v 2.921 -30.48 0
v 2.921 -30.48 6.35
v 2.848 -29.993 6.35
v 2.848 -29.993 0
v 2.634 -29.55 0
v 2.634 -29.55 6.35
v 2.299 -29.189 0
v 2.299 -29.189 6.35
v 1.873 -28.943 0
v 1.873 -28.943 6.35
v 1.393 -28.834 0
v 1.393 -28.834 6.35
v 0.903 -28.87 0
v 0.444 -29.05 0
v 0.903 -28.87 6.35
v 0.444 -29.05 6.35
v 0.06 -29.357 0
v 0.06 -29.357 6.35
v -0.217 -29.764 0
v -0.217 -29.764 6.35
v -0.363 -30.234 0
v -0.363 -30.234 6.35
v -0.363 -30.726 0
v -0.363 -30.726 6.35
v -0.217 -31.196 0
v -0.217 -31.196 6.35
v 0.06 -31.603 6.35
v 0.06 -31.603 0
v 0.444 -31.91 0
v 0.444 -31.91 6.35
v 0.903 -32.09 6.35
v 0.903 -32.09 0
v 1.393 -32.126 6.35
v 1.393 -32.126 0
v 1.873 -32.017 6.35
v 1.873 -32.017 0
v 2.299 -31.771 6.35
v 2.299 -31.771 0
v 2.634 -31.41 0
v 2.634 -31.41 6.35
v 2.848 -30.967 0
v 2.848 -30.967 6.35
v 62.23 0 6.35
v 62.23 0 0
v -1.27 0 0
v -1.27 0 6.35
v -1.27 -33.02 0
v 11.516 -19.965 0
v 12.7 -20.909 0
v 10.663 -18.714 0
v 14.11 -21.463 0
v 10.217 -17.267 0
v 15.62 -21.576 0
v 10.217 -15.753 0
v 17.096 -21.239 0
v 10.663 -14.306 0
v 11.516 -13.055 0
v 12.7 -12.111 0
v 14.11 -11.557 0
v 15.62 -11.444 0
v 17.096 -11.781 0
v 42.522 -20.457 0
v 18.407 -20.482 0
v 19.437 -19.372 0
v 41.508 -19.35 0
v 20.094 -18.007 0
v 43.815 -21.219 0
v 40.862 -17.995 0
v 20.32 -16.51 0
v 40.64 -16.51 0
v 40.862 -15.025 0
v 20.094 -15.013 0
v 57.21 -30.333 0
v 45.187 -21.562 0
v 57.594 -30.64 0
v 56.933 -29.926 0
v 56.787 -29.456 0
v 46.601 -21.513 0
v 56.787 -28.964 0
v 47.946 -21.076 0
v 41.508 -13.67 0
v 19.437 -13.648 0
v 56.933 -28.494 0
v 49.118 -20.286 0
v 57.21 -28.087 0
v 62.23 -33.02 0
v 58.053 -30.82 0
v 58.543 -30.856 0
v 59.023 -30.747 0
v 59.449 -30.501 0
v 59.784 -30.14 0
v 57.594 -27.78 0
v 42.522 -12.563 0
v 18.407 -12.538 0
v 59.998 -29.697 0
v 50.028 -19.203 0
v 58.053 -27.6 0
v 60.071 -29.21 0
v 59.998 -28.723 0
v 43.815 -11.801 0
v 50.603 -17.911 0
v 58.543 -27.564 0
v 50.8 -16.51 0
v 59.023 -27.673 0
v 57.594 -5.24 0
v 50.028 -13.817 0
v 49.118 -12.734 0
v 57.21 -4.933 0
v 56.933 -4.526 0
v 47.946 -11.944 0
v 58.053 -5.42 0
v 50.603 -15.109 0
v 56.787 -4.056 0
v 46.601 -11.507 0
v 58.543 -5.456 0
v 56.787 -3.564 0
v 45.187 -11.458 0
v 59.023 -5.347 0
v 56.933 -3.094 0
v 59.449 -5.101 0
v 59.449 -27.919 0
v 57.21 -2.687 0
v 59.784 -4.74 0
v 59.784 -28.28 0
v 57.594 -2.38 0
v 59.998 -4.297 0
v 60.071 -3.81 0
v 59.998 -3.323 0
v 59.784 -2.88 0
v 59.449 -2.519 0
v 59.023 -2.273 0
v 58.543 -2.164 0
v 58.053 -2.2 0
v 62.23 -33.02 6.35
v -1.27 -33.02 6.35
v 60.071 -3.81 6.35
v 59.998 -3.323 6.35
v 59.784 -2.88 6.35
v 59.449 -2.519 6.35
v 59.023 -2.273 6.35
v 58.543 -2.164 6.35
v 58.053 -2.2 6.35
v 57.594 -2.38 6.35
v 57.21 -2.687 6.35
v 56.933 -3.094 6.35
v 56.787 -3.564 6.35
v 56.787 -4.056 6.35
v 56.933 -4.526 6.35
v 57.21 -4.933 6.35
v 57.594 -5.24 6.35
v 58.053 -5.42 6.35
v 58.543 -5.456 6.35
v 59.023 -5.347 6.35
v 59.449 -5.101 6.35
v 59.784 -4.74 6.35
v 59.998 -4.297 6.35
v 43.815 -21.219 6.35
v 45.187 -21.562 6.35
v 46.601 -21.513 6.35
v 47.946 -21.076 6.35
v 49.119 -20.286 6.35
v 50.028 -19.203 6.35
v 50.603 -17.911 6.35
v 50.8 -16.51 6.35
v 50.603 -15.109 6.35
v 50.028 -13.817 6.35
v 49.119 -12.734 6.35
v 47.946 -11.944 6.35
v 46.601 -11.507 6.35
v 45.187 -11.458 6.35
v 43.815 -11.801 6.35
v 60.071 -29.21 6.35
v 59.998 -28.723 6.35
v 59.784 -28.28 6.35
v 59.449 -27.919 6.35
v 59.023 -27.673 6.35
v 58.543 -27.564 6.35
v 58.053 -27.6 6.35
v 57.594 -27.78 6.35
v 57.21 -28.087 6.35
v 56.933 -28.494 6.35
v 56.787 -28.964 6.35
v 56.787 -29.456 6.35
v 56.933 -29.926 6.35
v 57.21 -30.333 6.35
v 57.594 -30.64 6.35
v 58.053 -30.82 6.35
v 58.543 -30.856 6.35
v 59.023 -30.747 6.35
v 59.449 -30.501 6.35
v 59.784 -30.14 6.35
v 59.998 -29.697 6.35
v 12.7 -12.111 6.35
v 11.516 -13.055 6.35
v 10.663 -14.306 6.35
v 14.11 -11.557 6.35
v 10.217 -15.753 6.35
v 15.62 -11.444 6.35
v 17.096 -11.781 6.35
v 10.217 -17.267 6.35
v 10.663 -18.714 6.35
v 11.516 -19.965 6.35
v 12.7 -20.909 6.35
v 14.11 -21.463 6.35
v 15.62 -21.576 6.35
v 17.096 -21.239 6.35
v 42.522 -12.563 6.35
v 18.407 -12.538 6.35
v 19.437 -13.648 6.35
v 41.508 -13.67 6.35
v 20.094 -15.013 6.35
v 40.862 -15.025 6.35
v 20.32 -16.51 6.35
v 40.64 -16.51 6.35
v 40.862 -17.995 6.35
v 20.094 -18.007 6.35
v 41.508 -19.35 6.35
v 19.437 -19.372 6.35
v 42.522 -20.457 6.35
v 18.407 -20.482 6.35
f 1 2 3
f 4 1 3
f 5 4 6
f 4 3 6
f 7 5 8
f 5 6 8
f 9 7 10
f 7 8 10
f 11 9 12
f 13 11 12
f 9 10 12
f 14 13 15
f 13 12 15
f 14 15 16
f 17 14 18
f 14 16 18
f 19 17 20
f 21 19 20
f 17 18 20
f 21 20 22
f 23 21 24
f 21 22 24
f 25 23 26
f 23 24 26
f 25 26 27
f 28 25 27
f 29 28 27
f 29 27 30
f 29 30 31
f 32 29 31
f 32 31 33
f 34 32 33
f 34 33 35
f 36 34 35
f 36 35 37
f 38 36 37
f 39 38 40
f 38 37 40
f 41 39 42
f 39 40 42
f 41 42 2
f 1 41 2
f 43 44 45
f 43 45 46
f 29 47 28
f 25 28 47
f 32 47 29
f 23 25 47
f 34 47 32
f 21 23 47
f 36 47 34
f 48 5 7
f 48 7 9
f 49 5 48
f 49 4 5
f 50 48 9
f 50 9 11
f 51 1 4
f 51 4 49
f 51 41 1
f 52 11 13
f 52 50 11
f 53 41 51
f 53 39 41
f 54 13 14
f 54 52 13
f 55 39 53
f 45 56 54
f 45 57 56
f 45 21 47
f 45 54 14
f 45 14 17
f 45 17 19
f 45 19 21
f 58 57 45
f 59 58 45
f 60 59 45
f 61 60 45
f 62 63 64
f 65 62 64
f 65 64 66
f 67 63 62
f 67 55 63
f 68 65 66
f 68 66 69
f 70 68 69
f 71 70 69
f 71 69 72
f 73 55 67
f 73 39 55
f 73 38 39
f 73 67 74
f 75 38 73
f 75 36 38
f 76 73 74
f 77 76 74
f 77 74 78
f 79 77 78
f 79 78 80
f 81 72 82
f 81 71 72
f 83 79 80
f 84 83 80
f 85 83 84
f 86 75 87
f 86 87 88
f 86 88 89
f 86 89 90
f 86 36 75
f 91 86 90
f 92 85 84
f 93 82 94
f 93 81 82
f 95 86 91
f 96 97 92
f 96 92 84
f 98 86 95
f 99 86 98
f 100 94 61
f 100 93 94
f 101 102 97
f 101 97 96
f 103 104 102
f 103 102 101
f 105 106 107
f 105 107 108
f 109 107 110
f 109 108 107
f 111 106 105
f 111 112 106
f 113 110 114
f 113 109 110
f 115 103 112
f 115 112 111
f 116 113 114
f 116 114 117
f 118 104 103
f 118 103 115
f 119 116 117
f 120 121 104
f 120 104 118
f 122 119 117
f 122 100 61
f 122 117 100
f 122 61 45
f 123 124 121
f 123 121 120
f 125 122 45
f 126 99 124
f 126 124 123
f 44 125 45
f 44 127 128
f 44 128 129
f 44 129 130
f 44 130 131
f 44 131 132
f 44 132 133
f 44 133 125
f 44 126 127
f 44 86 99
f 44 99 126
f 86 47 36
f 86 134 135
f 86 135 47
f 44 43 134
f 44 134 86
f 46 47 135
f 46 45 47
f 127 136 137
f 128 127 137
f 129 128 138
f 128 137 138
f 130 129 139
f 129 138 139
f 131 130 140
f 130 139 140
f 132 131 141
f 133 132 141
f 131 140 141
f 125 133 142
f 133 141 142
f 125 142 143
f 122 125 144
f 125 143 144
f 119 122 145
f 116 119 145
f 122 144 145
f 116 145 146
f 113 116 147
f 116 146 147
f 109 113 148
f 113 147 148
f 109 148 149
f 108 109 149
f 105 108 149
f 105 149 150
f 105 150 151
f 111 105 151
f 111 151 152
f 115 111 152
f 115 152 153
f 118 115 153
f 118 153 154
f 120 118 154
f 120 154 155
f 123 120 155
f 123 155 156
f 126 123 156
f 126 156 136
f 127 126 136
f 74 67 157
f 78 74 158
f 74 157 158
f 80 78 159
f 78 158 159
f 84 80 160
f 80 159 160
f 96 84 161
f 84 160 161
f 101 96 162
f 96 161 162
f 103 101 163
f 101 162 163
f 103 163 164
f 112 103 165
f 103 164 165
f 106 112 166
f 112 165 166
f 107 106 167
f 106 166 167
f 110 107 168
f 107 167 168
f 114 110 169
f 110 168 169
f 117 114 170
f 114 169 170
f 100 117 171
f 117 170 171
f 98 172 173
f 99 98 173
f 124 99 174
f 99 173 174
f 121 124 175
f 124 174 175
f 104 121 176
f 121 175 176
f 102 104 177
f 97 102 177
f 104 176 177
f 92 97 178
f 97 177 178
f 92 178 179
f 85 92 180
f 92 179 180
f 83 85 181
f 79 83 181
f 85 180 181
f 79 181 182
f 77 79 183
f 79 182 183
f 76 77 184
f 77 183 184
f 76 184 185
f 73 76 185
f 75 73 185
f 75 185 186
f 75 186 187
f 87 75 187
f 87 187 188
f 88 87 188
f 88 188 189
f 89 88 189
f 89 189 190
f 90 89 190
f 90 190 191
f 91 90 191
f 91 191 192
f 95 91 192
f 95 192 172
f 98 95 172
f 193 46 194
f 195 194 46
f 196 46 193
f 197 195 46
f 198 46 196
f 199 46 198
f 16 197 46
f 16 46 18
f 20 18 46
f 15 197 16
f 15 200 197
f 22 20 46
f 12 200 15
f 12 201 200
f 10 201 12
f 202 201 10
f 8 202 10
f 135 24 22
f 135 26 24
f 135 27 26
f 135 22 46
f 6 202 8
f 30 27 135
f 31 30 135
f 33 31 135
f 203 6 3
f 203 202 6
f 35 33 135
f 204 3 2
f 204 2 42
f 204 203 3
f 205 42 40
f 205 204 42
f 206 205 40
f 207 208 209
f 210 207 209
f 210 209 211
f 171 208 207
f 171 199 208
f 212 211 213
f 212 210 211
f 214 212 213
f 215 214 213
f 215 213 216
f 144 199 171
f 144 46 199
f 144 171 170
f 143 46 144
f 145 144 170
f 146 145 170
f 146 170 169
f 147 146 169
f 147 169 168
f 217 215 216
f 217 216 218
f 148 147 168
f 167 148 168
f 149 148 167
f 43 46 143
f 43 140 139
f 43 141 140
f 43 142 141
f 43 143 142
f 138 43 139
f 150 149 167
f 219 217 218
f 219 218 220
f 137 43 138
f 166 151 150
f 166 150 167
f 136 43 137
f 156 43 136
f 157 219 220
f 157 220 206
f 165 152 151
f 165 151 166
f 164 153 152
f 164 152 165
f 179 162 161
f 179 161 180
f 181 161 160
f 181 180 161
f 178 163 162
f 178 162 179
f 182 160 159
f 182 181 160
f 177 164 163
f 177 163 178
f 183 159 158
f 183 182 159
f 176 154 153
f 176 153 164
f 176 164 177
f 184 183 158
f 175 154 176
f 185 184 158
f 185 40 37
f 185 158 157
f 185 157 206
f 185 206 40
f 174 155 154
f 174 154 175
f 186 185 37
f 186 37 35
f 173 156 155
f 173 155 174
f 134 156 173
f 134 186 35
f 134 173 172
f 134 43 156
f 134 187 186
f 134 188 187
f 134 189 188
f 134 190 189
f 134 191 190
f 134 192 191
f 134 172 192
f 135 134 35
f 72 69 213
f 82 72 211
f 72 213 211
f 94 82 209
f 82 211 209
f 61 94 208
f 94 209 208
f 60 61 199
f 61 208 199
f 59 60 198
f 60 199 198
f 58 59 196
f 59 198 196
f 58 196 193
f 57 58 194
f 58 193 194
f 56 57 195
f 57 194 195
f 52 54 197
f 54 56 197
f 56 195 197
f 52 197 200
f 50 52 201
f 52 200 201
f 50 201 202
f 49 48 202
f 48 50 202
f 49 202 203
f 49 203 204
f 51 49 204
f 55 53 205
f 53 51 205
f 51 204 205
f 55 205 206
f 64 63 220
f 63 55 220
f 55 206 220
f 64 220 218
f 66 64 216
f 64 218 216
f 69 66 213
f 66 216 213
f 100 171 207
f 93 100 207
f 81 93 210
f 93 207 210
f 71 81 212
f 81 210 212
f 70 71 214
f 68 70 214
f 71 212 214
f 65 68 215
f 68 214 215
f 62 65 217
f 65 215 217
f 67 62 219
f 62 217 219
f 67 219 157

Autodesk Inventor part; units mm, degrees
ref_plane "YZ Plane" through (0, 0, 0) normal (1, 0, 0) x (0, 1, 0)
ref_plane "XZ Plane" through (0, 0, 0) normal (0, 1, 0) x (-1, 0, 0)
ref_plane "XY Plane" through (0, 0, 0) normal (0, 0, 1) x (1, 0, 0)
sketch "Sketch1" plane through (0, 0, 0) normal (0, 0, 1) x (1, 0, 0)
  line L0 (0, 0) -> (58.42, 0)
  line L1 (58.42, 0) -> (58.42, -33.02)
  line L2 (58.42, -33.02) -> (0, -33.02)
  line L3 (0, -33.02) -> (0, 0)
  dimension "d0" = 58.42
  dimension "d1" = 33.02
extrude "Extrusion1" add sketch "Sketch1" along normal blind 6.35
sketch "Sketch4" plane through (0, 0, 6.35) normal (0, 0, 1) x (1, 0, 0)
  point P0 (0, 0)
sketch "Sketch5" plane through (58.42, -33.02, 0) normal (1, 0, 0) x (0, 0, -1)
  line L0 (-6.35, 33.02) -> (-6.35, 0) projected
  line L1 (0, 33.02) -> (-6.35, 33.02)
  line L2 (-6.35, 33.02) -> (-6.35, 0)
  line L3 (-6.35, 0) -> (0, 0)
  line L4 (0, 0) -> (0, 33.02)
extrude "Extrusion4" add sketch "Sketch5" along normal blind 5.08
sketch "Sketch6" plane through (0, 0, 6.35) normal (0, 0, 1) x (1, 0, 0)
  circle A0 centre (15.24, -16.51) radius 5.08
  line L0 (0, 0) -> (63.5, 0) projected
  line L1 (0, 0) -> (0, -33.02) projected
  circle A1 centre (41.91, -16.51) radius 5.08
  dimension "d16" = 10.16
  dimension "d17" = 16.51
  dimension "d18" = 15.24
  dimension "d19" = 10.16
  dimension "d20" = 26.67
extrude "Extrusion5" cut sketch "Sketch6" against normal blind 7.62
sketch "Sketch7" plane through (0, -33.02, 0) normal (-1, 0, 0) x (0, 0, 1)
  line L0 (6.35, 33.02) -> (6.35, 0) projected
  line L1 (0, 33.02) -> (6.35, 33.02)
  line L2 (6.35, 33.02) -> (6.35, 0)
  line L3 (6.35, 0) -> (0, 0)
  line L4 (0, 0) -> (0, 33.02)
extrude "Extrusion6" add sketch "Sketch7" along normal blind 2.54
sketch "Sketch8" plane through (-2.54, -33.02, 0) normal (-1, 0, 0) x (0, 0, 1)
  line L0 (6.35, 0) -> (0, 0) projected
  line L1 (0, 33.02) -> (6.35, 33.02)
  line L2 (6.35, 33.02) -> (6.35, 0)
  line L3 (6.35, 0) -> (0, 0)
  line L4 (0, 0) -> (0, 33.02)
extrude "Extrusion7" cut sketch "Sketch8" against normal blind 1.27
sketch "Sketch10" plane through (63.5, -33.02, 0) normal (1, 0, 0) x (0, 0, -1)
  line L0 (0, 33.02) -> (-6.35, 33.02) projected
  line L1 (-6.35, 33.02) -> (0, 33.02)
  line L2 (0, 33.02) -> (0, 0)
  line L3 (0, 0) -> (-6.35, 0)
  line L4 (-6.35, 0) -> (-6.35, 33.02)
extrude "Extrusion9" cut sketch "Sketch10" against normal blind 1.27
sketch "Sketch11" plane through (0, 0, 6.35) normal (0, 0, 1) x (1, 0, 0)
  circle A0 centre (58.42, -3.81) radius 1.651
  circle A1 centre (58.42, -29.21) radius 1.651
  line L0 (62.23, -33.02) -> (62.23, 0) projected
  line L1 (-1.27, 0) -> (62.23, 0) projected
  line L2 (62.23, -33.02) -> (-1.27, -33.02) projected
  point P0 (0, 0)
  dimension "d37" = 3.302
  dimension "d38" = 3.302
  dimension "d39" = 3.81
  dimension "d40" = 3.81
  dimension "d41" = 3.81
  dimension "d42" = 3.81
extrude "Extrusion10" cut sketch "Sketch11" against normal blind 6.35
sketch "Sketch12" plane through (0, 0, 6.35) normal (0, 0, 1) x (1, 0, 0)
  circle A0 centre (1.27, -30.48) radius 1.651
  line L0 (62.23, -33.02) -> (-1.27, -33.02) projected
  line L1 (-1.27, 0) -> (-1.27, -33.02) projected
  point P0 (0, 0)
  dimension "d45" = 3.302
  dimension "d46" = 2.54
  dimension "d47" = 2.54
extrude "Extrusion11" cut sketch "Sketch12" against normal blind 6.35
sketch "Sketch14" plane through (0, 0, 6.35) normal (0, 0, 1) x (1, 0, 0)
  line L0 (62.23, -33.02) -> (-1.27, -33.02) projected
  circle A0 centre (15.24, -16.51) radius 5.08 projected
  circle A1 centre (45.72, -16.51) radius 5.08
  circle A2 centre (45.72, -16.51) radius 9.5628
  point P0 (0, 0)
  dimension "d55" = 16.51
  dimension "d56" = 30.48
  dimension "d57" = 10.16
extrude "Extrusion13" add sketch "Sketch14" against normal blind 25.4 contours A2
sketch "Sketch15" plane through (0, 0, 6.35) normal (0, 0, 1) x (1, 0, 0)
  arc A0 (43.815, -21.2193) -> (43.815, -11.8007) centre (45.72, -16.51) ccw projected
  circle A1 centre (45.72, -16.51) radius 5.08
  point P0 (0, 0)
  dimension "d60" = 10.16
extrude "Extrusion14" cut sketch "Sketch15" against normal blind 25.4
sketch "Sketch16" plane through (62.23, -33.02, 0) normal (1, 0, 0) x (0, 0, -1)
  line L0 (0, 33.02) -> (24.9561, 33.02)
  line L1 (24.9561, 33.02) -> (24.9561, -0.1066)
  line L2 (24.9561, -0.1066) -> (0, -0.1066)
  line L3 (0, -0.1066) -> (0, 33.02)
extrude "Extrusion15" cut sketch "Sketch16" against normal blind 50.8
properties part number "claw attachment back"
